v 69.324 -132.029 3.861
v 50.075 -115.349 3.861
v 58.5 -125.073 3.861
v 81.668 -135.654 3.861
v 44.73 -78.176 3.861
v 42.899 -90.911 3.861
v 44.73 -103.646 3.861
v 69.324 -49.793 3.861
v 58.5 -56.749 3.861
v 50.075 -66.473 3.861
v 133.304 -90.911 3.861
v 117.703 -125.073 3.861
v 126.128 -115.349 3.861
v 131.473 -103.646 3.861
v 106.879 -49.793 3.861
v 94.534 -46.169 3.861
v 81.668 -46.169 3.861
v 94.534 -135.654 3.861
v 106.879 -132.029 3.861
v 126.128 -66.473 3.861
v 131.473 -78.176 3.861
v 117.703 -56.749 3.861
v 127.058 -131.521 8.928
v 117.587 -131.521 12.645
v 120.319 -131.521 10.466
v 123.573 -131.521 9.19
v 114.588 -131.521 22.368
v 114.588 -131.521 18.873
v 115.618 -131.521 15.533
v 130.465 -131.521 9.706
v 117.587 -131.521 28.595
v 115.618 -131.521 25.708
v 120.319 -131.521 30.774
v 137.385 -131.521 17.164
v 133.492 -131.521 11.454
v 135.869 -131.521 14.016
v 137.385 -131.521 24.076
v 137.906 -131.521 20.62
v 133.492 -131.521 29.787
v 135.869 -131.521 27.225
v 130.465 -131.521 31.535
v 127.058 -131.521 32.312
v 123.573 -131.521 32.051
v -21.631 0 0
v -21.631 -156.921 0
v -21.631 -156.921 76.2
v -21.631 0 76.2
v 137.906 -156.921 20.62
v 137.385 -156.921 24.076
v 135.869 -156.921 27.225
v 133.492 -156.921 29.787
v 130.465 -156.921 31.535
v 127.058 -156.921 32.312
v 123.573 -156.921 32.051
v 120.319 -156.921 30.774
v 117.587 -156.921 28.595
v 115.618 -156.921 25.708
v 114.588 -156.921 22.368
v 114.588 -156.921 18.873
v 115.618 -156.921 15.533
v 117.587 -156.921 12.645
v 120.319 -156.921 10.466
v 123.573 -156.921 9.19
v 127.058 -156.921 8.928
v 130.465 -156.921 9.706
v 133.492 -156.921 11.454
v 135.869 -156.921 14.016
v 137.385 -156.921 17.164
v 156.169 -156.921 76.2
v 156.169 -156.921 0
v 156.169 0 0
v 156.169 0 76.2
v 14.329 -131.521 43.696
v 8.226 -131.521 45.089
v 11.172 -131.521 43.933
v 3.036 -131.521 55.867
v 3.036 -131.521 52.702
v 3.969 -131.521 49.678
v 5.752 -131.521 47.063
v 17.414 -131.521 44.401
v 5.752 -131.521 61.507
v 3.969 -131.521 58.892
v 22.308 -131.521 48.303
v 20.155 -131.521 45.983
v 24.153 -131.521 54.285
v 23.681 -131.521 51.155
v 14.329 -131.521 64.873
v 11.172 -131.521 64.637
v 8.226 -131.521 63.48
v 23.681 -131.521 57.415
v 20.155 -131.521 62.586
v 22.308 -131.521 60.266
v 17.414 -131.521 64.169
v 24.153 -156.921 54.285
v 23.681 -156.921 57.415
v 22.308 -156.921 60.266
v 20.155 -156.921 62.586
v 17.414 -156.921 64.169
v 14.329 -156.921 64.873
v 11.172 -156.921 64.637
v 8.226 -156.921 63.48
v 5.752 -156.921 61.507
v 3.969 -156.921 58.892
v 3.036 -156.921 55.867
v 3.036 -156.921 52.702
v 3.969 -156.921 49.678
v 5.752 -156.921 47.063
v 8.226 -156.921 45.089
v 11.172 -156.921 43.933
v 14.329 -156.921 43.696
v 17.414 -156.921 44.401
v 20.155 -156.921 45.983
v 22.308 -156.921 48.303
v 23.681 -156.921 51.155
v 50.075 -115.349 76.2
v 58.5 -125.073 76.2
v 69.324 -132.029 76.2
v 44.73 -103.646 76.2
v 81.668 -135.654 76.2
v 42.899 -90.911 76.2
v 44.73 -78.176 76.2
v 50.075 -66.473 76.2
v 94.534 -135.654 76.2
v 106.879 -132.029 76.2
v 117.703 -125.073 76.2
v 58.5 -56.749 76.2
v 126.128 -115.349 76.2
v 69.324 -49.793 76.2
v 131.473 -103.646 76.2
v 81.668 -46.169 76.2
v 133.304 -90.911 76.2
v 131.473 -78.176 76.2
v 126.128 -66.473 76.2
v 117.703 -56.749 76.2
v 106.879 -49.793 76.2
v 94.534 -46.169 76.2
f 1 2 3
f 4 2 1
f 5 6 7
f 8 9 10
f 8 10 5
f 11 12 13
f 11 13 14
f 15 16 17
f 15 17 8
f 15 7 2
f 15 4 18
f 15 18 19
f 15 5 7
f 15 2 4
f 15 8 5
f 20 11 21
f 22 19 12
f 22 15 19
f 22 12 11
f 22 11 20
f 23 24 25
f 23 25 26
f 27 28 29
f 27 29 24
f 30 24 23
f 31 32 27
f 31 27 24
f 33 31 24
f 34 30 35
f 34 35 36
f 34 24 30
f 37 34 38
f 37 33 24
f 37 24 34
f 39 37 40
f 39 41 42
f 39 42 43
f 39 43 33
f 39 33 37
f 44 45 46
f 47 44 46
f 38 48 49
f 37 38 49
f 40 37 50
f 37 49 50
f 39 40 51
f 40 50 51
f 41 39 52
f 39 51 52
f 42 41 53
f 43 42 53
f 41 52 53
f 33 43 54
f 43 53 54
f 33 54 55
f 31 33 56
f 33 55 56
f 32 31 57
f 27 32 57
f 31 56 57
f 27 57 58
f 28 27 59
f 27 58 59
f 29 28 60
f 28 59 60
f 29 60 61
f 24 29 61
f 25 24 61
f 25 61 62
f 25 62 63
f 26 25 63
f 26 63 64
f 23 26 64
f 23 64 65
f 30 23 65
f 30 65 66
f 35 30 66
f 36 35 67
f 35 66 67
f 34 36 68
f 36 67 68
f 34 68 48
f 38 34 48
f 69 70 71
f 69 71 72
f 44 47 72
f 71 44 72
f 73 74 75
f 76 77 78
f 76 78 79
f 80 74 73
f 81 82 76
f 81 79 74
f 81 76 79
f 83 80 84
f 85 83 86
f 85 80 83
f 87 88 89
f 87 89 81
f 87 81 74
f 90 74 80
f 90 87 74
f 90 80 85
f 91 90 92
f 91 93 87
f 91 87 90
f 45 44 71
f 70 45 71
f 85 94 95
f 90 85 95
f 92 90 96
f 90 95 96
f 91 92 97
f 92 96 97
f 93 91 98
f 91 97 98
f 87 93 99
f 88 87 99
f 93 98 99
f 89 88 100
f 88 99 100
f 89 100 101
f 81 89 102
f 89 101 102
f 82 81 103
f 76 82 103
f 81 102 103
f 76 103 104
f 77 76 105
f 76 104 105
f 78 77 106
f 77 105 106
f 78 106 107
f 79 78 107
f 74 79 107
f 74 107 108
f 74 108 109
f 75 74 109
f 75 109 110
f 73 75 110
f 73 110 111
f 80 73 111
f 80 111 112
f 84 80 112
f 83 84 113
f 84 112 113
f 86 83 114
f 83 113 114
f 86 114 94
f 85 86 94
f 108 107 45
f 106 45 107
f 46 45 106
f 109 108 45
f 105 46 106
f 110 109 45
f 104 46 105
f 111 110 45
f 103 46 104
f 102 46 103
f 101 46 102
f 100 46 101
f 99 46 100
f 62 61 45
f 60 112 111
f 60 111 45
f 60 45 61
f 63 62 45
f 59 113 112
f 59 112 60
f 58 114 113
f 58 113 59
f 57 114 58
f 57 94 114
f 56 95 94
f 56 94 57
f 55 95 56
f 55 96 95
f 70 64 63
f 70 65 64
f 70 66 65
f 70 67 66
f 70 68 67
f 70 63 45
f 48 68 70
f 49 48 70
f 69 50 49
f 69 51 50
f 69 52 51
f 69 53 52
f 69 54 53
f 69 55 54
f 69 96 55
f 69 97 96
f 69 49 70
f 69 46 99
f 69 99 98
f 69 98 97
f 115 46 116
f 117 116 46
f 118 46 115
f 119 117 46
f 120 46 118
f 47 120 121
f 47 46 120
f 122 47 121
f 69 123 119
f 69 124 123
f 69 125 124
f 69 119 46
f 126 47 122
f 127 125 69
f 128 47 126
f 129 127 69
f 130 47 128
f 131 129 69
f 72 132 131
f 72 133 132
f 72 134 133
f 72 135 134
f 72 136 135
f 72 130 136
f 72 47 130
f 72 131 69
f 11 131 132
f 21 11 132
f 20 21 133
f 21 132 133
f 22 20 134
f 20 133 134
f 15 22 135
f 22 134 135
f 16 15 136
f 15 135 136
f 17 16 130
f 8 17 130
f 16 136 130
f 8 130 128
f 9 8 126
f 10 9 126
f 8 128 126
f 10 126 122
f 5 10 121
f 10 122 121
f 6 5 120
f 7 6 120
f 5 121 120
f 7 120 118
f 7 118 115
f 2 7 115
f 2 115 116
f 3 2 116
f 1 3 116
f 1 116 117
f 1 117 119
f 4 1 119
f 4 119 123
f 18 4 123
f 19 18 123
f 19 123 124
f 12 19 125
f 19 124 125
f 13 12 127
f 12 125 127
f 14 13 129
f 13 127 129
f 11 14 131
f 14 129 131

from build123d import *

# Parameters (mm, degrees)
F0_W     = 177.8
F0_H     = 76.2
F5_DEPTH = 156.920815
F1_R     = 45.202558
F2_DEPTH = 72.338598
F3_R     = 10.618038
F3_R_2   = 11.724793
F4_DEPTH = 25.4


with BuildPart() as f5:
    # F0 (on Front) → F5 (new body)
    with BuildSketch(Plane.XZ):
        with Locations((67.268712, 38.1)):
            Rectangle(F0_W, F0_H)
    extrude(amount=F5_DEPTH)

    # F1 (on face) → F2 (cut)
    with BuildSketch(Plane.XY.offset(76.2)):
        with Locations((88.101327, -90.911075)):
            Circle(F1_R)
    extrude(amount=-F2_DEPTH, mode=Mode.SUBTRACT)

    # F3 (on face) → F4 (cut)
    with BuildSketch(Plane.XZ.offset(156.920815)):
        with Locations((13.535074, 54.284833)):
            Circle(F3_R)
        with Locations((126.181513, 20.620376)):
            Circle(F3_R_2)
    extrude(amount=-F4_DEPTH, mode=Mode.SUBTRACT)


solid = f5.part
